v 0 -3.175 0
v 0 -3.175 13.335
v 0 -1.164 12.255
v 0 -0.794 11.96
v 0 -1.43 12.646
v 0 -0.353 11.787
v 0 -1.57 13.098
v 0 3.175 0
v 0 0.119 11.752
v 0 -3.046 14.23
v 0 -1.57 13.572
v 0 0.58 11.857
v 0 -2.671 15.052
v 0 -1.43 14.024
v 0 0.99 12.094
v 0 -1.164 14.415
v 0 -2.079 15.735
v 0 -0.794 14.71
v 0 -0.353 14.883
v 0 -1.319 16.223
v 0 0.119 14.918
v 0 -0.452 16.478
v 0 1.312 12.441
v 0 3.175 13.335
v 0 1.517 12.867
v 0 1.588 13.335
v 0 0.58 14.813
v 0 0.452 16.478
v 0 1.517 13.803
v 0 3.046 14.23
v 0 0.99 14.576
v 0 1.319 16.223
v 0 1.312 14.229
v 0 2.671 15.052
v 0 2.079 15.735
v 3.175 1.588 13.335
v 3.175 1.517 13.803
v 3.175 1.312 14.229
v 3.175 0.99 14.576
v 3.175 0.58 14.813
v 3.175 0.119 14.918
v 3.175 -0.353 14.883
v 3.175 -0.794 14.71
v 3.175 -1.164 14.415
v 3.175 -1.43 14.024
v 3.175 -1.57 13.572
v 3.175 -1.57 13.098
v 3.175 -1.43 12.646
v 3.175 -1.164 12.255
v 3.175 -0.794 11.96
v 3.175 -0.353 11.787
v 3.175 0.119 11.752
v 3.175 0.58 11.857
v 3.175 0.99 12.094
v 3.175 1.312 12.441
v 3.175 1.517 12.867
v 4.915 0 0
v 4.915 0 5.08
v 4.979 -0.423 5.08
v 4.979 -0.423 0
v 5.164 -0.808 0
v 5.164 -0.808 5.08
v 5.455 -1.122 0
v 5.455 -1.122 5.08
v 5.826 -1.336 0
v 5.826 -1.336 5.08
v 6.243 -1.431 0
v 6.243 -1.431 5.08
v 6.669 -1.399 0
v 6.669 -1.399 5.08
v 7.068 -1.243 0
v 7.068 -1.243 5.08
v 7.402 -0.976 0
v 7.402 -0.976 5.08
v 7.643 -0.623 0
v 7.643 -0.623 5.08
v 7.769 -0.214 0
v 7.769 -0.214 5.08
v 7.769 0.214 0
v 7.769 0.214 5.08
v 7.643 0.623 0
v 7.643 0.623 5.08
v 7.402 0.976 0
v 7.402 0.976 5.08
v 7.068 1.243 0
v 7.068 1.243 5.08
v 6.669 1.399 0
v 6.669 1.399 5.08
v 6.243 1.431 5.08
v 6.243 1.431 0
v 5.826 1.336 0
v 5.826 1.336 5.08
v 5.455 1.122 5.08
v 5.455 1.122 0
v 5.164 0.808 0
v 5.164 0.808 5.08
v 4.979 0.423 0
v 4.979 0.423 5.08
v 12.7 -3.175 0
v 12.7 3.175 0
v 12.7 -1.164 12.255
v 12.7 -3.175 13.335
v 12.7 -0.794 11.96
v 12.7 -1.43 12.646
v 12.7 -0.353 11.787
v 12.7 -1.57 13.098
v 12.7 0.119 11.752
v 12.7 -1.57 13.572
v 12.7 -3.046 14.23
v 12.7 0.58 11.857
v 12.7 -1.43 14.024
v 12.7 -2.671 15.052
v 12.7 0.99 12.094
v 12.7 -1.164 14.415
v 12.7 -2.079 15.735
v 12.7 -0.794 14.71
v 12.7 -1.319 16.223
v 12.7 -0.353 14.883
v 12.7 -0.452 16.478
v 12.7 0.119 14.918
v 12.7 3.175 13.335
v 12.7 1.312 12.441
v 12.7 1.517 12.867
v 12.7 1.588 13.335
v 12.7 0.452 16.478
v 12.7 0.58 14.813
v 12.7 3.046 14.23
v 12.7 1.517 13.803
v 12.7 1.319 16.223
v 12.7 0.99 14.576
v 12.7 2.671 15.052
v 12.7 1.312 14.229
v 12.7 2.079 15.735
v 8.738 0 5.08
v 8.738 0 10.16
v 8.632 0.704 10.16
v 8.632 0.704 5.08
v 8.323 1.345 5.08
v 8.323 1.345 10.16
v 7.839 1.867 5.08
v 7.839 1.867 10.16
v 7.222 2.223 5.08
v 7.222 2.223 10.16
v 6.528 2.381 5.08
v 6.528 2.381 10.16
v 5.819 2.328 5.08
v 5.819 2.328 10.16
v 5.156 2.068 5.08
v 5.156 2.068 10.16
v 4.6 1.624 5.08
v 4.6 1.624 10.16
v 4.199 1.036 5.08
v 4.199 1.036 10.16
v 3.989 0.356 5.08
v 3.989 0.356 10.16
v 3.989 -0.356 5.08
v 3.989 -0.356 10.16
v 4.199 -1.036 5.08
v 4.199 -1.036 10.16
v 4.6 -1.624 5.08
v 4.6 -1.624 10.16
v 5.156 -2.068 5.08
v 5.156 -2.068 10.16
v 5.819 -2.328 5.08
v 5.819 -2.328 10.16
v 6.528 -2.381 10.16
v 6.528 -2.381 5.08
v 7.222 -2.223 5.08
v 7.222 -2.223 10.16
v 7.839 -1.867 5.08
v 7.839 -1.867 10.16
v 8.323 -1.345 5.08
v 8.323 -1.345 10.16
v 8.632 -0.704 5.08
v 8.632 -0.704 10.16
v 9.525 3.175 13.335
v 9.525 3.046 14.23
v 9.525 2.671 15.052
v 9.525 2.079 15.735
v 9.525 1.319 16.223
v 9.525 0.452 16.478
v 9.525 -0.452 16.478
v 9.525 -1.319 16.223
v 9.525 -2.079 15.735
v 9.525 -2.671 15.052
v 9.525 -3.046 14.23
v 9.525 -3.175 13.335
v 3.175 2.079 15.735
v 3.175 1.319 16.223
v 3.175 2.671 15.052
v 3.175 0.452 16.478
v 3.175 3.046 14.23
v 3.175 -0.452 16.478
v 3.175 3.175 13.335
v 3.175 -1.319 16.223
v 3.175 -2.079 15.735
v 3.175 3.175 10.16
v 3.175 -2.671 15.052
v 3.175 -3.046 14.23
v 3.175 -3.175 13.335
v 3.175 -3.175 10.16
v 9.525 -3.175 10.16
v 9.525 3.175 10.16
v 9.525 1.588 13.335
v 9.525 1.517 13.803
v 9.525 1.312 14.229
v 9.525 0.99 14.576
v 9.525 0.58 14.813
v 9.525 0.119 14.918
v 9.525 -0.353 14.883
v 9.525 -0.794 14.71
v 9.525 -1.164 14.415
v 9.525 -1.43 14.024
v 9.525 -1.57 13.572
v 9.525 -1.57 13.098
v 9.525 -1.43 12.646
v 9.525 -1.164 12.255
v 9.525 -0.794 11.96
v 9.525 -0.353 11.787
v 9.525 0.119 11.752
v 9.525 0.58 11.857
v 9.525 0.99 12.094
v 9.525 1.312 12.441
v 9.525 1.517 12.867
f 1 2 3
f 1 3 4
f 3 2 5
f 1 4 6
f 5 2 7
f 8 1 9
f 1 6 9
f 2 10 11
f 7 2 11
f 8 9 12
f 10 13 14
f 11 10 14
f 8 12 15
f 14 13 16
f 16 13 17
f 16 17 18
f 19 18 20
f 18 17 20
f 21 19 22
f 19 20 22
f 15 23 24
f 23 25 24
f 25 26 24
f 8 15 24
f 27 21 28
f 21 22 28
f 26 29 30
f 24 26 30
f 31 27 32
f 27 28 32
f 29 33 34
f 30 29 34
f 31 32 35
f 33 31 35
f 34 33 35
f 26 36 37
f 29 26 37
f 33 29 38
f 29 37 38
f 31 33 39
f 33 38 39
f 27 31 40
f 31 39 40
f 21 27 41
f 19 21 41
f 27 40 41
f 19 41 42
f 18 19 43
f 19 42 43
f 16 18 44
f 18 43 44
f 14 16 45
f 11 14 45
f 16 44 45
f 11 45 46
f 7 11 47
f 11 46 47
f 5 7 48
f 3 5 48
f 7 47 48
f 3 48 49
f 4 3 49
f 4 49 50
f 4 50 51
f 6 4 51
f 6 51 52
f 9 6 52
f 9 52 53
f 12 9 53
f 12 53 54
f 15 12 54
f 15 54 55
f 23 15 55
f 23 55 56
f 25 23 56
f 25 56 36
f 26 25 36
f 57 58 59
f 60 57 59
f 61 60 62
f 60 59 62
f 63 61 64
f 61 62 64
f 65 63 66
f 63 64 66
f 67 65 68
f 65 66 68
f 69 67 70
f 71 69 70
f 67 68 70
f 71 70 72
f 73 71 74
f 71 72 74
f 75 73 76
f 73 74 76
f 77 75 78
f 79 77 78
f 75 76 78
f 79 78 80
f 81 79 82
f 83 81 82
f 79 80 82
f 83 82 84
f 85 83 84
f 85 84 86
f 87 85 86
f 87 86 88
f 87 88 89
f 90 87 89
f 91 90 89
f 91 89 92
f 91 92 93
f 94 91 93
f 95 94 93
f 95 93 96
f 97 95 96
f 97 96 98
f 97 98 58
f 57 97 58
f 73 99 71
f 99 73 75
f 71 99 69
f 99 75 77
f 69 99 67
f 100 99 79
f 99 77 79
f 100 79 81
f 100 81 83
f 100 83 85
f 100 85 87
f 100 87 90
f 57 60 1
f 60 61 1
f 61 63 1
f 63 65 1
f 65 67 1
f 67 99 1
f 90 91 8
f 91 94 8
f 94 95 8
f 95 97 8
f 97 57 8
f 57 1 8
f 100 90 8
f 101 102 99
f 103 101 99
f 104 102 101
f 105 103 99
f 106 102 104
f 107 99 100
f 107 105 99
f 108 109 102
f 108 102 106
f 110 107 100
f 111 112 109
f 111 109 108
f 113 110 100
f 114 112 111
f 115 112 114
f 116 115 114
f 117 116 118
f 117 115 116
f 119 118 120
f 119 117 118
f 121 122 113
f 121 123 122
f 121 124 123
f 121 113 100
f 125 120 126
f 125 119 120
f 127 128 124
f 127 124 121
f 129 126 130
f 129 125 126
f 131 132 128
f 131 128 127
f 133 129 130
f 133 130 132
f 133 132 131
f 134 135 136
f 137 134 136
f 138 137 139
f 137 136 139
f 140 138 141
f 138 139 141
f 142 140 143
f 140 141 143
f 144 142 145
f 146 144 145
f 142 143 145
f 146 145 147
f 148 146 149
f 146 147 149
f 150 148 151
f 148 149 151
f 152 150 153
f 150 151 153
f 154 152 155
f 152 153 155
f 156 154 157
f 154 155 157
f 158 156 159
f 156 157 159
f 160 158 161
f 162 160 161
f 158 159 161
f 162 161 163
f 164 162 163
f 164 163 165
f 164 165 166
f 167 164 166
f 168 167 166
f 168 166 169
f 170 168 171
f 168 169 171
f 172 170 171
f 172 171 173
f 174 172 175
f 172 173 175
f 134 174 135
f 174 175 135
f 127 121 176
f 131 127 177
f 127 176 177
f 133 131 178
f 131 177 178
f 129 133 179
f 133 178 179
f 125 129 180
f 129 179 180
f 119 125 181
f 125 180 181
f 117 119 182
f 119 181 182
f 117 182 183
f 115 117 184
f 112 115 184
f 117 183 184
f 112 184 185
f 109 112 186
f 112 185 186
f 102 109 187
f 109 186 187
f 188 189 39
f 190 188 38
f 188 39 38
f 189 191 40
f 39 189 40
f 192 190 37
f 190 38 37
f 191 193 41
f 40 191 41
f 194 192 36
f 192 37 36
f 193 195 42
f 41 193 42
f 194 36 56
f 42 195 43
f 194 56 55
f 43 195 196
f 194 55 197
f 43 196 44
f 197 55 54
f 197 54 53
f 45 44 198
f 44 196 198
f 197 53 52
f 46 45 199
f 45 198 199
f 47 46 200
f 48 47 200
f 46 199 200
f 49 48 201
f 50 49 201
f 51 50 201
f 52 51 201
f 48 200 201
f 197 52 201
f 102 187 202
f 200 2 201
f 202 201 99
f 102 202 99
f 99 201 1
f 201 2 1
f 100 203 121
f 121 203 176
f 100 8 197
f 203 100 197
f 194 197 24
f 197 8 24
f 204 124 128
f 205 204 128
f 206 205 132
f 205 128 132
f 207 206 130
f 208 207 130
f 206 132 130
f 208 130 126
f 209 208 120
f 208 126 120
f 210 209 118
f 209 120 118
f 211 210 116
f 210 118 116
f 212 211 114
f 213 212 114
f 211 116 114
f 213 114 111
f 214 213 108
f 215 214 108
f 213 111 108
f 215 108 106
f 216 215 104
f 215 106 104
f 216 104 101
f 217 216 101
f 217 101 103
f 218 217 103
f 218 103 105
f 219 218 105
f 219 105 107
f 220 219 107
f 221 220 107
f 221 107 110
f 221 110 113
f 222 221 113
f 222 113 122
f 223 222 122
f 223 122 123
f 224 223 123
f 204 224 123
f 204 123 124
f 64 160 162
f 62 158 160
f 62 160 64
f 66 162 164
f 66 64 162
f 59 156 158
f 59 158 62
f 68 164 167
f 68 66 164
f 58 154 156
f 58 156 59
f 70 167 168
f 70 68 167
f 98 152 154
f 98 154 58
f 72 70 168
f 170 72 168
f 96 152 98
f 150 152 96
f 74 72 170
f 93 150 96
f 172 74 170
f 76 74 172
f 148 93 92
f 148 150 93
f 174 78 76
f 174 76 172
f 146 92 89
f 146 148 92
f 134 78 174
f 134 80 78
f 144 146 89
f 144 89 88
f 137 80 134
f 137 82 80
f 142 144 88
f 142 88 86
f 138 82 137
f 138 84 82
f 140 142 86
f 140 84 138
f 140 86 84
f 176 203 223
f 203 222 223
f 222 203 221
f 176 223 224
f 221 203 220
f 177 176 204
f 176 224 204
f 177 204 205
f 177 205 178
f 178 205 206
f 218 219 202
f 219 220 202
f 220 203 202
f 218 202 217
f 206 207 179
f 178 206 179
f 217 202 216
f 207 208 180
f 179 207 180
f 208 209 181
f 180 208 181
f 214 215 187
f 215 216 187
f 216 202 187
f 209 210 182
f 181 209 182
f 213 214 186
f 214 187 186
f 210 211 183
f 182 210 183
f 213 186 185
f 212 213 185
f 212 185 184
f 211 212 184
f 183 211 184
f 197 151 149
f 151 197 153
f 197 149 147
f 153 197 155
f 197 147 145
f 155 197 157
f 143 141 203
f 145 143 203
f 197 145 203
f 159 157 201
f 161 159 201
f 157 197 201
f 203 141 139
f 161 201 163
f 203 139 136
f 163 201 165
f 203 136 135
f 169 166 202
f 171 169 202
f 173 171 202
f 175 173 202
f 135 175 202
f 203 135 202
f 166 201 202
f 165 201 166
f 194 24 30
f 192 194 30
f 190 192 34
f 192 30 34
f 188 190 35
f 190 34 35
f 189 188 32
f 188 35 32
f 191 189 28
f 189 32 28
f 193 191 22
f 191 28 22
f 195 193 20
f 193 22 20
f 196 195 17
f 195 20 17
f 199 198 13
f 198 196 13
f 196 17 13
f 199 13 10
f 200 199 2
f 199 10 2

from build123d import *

# Parameters (mm, degrees)
F1_DEPTH = 12.7
F2_R     = 1.5875
F3_DEPTH = 25.4
F5_DEPTH = 25.4
F7_DEPTH = 25.4
F8_R     = 2.3876
F9_DEPTH = 5.08


with BuildPart() as f1:
    # F0 (on Right) → F1 (new body)
    with BuildSketch(Plane.YZ):
        with BuildLine():
            Line((-3.175, 0), (0, 0))
            Line((0, 0), (3.175, 0))
            Line((3.175, 0), (3.175, 13.335))
            ThreePointArc((3.175, 13.335), (0, 16.51), (-3.175, 13.335))
            Line((-3.175, 13.335), (-3.175, 0))
        make_face()
    extrude(amount=F1_DEPTH)

    # F2 (on face) → F3 (cut)
    with BuildSketch(Plane.YZ.offset(12.7)):
        with Locations((0, 13.335)):
            Circle(F2_R)
    extrude(amount=-F3_DEPTH, mode=Mode.SUBTRACT)

    # F4 (on face) → F5 (cut)
    with BuildSketch(Plane.XZ.offset(3.175)):
        Polygon((3.175, 10.16), (6.35, 10.16), (9.525, 10.16), (9.525, 19.146023), (3.175, 19.146023), align=None)
    extrude(amount=-F5_DEPTH, mode=Mode.SUBTRACT)

    # F6 (on face) → F7 (cut)
    with BuildSketch(Plane.XY.offset(10.16)):
        with BuildLine():
            ThreePointArc((7.7851, 0), (6.35, 1.4351), (4.9149, 0))
            Line((4.9149, 0), (7.7851, 0))
        make_face()
        with BuildLine():
            Line((7.7851, 0), (4.9149, 0))
            ThreePointArc((4.9149, 0), (6.35, -1.4351), (7.7851, 0))
        make_face()
    extrude(amount=-F7_DEPTH, mode=Mode.SUBTRACT)

    # F8 (on face) → F9 (cut)
    with BuildSketch(Plane.XY.offset(10.16)):
        with Locations((6.35, 0)):
            Circle(F8_R)
    extrude(amount=-F9_DEPTH, mode=Mode.SUBTRACT)


solid = f1.part
